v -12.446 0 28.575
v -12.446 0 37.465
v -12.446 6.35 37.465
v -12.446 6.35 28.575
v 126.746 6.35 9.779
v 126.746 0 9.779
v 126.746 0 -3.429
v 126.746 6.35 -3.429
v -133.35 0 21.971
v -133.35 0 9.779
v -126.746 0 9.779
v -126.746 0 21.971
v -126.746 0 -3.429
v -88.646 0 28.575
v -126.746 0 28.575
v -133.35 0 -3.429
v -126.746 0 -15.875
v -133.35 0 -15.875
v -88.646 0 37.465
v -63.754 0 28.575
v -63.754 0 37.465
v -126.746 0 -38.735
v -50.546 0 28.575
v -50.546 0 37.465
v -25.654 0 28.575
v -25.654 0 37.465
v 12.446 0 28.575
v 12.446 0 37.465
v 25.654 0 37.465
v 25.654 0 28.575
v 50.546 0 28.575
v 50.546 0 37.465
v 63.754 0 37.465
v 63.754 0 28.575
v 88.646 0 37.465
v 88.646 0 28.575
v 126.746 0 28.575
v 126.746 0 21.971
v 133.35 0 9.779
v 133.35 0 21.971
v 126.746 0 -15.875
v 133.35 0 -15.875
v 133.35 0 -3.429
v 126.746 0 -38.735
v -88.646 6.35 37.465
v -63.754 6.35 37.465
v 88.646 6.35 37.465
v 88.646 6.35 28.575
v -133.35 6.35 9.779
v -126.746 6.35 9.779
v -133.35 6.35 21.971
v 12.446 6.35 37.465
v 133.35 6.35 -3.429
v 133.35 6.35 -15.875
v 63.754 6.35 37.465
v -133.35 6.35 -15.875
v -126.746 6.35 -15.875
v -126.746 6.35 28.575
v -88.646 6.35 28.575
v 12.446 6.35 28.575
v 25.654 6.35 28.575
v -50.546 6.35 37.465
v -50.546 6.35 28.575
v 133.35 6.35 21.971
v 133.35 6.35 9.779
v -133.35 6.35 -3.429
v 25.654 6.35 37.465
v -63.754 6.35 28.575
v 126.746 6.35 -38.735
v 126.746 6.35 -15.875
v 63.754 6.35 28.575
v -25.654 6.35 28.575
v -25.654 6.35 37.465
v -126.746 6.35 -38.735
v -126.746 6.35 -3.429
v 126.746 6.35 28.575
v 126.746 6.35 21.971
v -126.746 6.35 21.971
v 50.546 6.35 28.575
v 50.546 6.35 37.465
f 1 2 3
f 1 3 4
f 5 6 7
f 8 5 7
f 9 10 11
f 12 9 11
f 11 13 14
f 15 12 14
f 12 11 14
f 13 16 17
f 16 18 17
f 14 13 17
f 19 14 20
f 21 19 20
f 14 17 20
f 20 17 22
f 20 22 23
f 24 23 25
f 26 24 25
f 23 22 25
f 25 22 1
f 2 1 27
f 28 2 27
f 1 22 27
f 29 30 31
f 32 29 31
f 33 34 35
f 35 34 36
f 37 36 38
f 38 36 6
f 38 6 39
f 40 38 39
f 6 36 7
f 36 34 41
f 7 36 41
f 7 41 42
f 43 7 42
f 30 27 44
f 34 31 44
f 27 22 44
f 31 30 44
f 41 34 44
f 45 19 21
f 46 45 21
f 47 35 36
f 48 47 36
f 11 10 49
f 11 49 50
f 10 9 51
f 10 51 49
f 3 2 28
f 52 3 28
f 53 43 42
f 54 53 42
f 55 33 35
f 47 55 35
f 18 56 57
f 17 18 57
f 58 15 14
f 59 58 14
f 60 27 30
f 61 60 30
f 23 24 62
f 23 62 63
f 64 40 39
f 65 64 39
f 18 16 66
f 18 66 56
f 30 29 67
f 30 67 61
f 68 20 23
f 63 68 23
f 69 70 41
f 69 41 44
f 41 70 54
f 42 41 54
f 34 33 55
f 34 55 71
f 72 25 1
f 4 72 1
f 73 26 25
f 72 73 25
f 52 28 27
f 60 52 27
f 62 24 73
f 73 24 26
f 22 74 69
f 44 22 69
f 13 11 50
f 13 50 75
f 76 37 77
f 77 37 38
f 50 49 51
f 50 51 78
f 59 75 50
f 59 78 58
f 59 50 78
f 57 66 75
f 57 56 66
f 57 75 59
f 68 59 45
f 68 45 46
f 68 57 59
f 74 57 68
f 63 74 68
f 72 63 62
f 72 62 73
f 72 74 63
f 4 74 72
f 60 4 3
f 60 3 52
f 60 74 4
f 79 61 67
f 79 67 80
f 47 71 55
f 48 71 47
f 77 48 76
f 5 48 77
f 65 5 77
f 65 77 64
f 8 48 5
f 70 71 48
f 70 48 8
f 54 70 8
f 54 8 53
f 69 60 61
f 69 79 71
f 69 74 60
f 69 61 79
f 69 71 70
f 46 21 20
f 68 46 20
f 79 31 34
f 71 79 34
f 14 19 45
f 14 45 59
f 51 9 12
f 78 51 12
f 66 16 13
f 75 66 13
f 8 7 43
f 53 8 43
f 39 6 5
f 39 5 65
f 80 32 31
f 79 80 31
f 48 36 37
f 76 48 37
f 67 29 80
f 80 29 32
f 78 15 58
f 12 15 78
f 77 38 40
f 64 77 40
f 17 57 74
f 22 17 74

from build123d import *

# Parameters (mm, degrees)
SKETCH1_W           = 266.7
SKETCH1_H           = 57.15
BOSS_EXTRUDE1_DEPTH = 6.35
SKETCH3_W           = 24.892
SKETCH3_H           = 8.89
BOSS_EXTRUDE2_DEPTH = 6.35
SKETCH4_W           = 13.208
SKETCH4_H           = 13.208
CUT_EXTRUDE2_DEPTH  = 139.65846972
SKETCH5_W           = 295.464136086
SKETCH5_H           = 12.7
CUT_EXTRUDE3_DEPTH  = 139.65846972
SKETCH6_W           = 266.7
SKETCH6_H           = 12.446
BOSS_EXTRUDE3_DEPTH = 6.35
SKETCH7_W           = 253.492
SKETCH7_H           = 22.86
BOSS_EXTRUDE4_DEPTH = 6.35


with BuildPart() as part:
    # Sketch1 → Boss-Extrude1 (new body)
    with BuildSketch(Plane(origin=(0, 0, 0), x_dir=(1, 0, 0), z_dir=(0, 1, 0))):
        Rectangle(SKETCH1_W, SKETCH1_H)
    extrude(amount=BOSS_EXTRUDE1_DEPTH)

    # Sketch3 → Boss-Extrude2 (add)
    with BuildSketch(Plane(origin=(0, 0, 0), x_dir=(1, 0, 0), z_dir=(0, 1, 0))):
        with Locations((-76.2, -33.02)):
            Rectangle(SKETCH3_W, SKETCH3_H)
        with Locations((-38.1, -33.02)):
            Rectangle(SKETCH3_W, SKETCH3_H)
        with Locations((0, -33.02)):
            Rectangle(SKETCH3_W, SKETCH3_H)
        with Locations((38.1, -33.02)):
            Rectangle(SKETCH3_W, SKETCH3_H)
        with Locations((76.2, -33.02)):
            Rectangle(SKETCH3_W, SKETCH3_H)
    extrude(amount=BOSS_EXTRUDE2_DEPTH)

    # Sketch4 → Cut-Extrude2 (cut, through all)
    with BuildSketch(Plane(origin=(0, 0, 0), x_dir=(1, 0, 0), z_dir=(0, 1, 0))):
        with Locations((-133.35, 22.225)):
            Rectangle(SKETCH4_W, SKETCH4_H)
        with Locations((133.35, 22.225)):
            Rectangle(SKETCH4_W, SKETCH4_H)
        with Locations((-133.35, -3.175)):
            Rectangle(SKETCH4_W, SKETCH4_H)
        with Locations((-133.35, -28.575)):
            Rectangle(SKETCH4_W, SKETCH4_H)
        with Locations((133.35, -3.175)):
            Rectangle(SKETCH4_W, SKETCH4_H)
        with Locations((133.35, -28.575)):
            Rectangle(SKETCH4_W, SKETCH4_H)
    extrude(amount=CUT_EXTRUDE2_DEPTH, mode=Mode.SUBTRACT)

    # Sketch5 → Cut-Extrude3 (cut, through all)
    with BuildSketch(Plane(origin=(0, 6.35, 0), x_dir=(1, 0, 0), z_dir=(0, 1, 0))):
        with Locations((7.963252738, 22.225)):
            Rectangle(SKETCH5_W, SKETCH5_H)
    extrude(amount=-CUT_EXTRUDE3_DEPTH, mode=Mode.SUBTRACT)

    # Sketch6 → Boss-Extrude3 (add)
    with BuildSketch(Plane(origin=(0, 6.35, 0), x_dir=(1, 0, 0), z_dir=(0, 1, 0))):
        with Locations((0, 9.652)):
            Rectangle(SKETCH6_W, SKETCH6_H)
    extrude(amount=-BOSS_EXTRUDE3_DEPTH)

    # Sketch7 → Boss-Extrude4 (add)
    with BuildSketch(Plane(origin=(0, 6.35, 0), x_dir=(1, 0, 0), z_dir=(0, 1, 0))):
        with Locations((0, 27.305)):
            Rectangle(SKETCH7_W, SKETCH7_H)
    extrude(amount=-BOSS_EXTRUDE4_DEPTH)


solid = part.part
